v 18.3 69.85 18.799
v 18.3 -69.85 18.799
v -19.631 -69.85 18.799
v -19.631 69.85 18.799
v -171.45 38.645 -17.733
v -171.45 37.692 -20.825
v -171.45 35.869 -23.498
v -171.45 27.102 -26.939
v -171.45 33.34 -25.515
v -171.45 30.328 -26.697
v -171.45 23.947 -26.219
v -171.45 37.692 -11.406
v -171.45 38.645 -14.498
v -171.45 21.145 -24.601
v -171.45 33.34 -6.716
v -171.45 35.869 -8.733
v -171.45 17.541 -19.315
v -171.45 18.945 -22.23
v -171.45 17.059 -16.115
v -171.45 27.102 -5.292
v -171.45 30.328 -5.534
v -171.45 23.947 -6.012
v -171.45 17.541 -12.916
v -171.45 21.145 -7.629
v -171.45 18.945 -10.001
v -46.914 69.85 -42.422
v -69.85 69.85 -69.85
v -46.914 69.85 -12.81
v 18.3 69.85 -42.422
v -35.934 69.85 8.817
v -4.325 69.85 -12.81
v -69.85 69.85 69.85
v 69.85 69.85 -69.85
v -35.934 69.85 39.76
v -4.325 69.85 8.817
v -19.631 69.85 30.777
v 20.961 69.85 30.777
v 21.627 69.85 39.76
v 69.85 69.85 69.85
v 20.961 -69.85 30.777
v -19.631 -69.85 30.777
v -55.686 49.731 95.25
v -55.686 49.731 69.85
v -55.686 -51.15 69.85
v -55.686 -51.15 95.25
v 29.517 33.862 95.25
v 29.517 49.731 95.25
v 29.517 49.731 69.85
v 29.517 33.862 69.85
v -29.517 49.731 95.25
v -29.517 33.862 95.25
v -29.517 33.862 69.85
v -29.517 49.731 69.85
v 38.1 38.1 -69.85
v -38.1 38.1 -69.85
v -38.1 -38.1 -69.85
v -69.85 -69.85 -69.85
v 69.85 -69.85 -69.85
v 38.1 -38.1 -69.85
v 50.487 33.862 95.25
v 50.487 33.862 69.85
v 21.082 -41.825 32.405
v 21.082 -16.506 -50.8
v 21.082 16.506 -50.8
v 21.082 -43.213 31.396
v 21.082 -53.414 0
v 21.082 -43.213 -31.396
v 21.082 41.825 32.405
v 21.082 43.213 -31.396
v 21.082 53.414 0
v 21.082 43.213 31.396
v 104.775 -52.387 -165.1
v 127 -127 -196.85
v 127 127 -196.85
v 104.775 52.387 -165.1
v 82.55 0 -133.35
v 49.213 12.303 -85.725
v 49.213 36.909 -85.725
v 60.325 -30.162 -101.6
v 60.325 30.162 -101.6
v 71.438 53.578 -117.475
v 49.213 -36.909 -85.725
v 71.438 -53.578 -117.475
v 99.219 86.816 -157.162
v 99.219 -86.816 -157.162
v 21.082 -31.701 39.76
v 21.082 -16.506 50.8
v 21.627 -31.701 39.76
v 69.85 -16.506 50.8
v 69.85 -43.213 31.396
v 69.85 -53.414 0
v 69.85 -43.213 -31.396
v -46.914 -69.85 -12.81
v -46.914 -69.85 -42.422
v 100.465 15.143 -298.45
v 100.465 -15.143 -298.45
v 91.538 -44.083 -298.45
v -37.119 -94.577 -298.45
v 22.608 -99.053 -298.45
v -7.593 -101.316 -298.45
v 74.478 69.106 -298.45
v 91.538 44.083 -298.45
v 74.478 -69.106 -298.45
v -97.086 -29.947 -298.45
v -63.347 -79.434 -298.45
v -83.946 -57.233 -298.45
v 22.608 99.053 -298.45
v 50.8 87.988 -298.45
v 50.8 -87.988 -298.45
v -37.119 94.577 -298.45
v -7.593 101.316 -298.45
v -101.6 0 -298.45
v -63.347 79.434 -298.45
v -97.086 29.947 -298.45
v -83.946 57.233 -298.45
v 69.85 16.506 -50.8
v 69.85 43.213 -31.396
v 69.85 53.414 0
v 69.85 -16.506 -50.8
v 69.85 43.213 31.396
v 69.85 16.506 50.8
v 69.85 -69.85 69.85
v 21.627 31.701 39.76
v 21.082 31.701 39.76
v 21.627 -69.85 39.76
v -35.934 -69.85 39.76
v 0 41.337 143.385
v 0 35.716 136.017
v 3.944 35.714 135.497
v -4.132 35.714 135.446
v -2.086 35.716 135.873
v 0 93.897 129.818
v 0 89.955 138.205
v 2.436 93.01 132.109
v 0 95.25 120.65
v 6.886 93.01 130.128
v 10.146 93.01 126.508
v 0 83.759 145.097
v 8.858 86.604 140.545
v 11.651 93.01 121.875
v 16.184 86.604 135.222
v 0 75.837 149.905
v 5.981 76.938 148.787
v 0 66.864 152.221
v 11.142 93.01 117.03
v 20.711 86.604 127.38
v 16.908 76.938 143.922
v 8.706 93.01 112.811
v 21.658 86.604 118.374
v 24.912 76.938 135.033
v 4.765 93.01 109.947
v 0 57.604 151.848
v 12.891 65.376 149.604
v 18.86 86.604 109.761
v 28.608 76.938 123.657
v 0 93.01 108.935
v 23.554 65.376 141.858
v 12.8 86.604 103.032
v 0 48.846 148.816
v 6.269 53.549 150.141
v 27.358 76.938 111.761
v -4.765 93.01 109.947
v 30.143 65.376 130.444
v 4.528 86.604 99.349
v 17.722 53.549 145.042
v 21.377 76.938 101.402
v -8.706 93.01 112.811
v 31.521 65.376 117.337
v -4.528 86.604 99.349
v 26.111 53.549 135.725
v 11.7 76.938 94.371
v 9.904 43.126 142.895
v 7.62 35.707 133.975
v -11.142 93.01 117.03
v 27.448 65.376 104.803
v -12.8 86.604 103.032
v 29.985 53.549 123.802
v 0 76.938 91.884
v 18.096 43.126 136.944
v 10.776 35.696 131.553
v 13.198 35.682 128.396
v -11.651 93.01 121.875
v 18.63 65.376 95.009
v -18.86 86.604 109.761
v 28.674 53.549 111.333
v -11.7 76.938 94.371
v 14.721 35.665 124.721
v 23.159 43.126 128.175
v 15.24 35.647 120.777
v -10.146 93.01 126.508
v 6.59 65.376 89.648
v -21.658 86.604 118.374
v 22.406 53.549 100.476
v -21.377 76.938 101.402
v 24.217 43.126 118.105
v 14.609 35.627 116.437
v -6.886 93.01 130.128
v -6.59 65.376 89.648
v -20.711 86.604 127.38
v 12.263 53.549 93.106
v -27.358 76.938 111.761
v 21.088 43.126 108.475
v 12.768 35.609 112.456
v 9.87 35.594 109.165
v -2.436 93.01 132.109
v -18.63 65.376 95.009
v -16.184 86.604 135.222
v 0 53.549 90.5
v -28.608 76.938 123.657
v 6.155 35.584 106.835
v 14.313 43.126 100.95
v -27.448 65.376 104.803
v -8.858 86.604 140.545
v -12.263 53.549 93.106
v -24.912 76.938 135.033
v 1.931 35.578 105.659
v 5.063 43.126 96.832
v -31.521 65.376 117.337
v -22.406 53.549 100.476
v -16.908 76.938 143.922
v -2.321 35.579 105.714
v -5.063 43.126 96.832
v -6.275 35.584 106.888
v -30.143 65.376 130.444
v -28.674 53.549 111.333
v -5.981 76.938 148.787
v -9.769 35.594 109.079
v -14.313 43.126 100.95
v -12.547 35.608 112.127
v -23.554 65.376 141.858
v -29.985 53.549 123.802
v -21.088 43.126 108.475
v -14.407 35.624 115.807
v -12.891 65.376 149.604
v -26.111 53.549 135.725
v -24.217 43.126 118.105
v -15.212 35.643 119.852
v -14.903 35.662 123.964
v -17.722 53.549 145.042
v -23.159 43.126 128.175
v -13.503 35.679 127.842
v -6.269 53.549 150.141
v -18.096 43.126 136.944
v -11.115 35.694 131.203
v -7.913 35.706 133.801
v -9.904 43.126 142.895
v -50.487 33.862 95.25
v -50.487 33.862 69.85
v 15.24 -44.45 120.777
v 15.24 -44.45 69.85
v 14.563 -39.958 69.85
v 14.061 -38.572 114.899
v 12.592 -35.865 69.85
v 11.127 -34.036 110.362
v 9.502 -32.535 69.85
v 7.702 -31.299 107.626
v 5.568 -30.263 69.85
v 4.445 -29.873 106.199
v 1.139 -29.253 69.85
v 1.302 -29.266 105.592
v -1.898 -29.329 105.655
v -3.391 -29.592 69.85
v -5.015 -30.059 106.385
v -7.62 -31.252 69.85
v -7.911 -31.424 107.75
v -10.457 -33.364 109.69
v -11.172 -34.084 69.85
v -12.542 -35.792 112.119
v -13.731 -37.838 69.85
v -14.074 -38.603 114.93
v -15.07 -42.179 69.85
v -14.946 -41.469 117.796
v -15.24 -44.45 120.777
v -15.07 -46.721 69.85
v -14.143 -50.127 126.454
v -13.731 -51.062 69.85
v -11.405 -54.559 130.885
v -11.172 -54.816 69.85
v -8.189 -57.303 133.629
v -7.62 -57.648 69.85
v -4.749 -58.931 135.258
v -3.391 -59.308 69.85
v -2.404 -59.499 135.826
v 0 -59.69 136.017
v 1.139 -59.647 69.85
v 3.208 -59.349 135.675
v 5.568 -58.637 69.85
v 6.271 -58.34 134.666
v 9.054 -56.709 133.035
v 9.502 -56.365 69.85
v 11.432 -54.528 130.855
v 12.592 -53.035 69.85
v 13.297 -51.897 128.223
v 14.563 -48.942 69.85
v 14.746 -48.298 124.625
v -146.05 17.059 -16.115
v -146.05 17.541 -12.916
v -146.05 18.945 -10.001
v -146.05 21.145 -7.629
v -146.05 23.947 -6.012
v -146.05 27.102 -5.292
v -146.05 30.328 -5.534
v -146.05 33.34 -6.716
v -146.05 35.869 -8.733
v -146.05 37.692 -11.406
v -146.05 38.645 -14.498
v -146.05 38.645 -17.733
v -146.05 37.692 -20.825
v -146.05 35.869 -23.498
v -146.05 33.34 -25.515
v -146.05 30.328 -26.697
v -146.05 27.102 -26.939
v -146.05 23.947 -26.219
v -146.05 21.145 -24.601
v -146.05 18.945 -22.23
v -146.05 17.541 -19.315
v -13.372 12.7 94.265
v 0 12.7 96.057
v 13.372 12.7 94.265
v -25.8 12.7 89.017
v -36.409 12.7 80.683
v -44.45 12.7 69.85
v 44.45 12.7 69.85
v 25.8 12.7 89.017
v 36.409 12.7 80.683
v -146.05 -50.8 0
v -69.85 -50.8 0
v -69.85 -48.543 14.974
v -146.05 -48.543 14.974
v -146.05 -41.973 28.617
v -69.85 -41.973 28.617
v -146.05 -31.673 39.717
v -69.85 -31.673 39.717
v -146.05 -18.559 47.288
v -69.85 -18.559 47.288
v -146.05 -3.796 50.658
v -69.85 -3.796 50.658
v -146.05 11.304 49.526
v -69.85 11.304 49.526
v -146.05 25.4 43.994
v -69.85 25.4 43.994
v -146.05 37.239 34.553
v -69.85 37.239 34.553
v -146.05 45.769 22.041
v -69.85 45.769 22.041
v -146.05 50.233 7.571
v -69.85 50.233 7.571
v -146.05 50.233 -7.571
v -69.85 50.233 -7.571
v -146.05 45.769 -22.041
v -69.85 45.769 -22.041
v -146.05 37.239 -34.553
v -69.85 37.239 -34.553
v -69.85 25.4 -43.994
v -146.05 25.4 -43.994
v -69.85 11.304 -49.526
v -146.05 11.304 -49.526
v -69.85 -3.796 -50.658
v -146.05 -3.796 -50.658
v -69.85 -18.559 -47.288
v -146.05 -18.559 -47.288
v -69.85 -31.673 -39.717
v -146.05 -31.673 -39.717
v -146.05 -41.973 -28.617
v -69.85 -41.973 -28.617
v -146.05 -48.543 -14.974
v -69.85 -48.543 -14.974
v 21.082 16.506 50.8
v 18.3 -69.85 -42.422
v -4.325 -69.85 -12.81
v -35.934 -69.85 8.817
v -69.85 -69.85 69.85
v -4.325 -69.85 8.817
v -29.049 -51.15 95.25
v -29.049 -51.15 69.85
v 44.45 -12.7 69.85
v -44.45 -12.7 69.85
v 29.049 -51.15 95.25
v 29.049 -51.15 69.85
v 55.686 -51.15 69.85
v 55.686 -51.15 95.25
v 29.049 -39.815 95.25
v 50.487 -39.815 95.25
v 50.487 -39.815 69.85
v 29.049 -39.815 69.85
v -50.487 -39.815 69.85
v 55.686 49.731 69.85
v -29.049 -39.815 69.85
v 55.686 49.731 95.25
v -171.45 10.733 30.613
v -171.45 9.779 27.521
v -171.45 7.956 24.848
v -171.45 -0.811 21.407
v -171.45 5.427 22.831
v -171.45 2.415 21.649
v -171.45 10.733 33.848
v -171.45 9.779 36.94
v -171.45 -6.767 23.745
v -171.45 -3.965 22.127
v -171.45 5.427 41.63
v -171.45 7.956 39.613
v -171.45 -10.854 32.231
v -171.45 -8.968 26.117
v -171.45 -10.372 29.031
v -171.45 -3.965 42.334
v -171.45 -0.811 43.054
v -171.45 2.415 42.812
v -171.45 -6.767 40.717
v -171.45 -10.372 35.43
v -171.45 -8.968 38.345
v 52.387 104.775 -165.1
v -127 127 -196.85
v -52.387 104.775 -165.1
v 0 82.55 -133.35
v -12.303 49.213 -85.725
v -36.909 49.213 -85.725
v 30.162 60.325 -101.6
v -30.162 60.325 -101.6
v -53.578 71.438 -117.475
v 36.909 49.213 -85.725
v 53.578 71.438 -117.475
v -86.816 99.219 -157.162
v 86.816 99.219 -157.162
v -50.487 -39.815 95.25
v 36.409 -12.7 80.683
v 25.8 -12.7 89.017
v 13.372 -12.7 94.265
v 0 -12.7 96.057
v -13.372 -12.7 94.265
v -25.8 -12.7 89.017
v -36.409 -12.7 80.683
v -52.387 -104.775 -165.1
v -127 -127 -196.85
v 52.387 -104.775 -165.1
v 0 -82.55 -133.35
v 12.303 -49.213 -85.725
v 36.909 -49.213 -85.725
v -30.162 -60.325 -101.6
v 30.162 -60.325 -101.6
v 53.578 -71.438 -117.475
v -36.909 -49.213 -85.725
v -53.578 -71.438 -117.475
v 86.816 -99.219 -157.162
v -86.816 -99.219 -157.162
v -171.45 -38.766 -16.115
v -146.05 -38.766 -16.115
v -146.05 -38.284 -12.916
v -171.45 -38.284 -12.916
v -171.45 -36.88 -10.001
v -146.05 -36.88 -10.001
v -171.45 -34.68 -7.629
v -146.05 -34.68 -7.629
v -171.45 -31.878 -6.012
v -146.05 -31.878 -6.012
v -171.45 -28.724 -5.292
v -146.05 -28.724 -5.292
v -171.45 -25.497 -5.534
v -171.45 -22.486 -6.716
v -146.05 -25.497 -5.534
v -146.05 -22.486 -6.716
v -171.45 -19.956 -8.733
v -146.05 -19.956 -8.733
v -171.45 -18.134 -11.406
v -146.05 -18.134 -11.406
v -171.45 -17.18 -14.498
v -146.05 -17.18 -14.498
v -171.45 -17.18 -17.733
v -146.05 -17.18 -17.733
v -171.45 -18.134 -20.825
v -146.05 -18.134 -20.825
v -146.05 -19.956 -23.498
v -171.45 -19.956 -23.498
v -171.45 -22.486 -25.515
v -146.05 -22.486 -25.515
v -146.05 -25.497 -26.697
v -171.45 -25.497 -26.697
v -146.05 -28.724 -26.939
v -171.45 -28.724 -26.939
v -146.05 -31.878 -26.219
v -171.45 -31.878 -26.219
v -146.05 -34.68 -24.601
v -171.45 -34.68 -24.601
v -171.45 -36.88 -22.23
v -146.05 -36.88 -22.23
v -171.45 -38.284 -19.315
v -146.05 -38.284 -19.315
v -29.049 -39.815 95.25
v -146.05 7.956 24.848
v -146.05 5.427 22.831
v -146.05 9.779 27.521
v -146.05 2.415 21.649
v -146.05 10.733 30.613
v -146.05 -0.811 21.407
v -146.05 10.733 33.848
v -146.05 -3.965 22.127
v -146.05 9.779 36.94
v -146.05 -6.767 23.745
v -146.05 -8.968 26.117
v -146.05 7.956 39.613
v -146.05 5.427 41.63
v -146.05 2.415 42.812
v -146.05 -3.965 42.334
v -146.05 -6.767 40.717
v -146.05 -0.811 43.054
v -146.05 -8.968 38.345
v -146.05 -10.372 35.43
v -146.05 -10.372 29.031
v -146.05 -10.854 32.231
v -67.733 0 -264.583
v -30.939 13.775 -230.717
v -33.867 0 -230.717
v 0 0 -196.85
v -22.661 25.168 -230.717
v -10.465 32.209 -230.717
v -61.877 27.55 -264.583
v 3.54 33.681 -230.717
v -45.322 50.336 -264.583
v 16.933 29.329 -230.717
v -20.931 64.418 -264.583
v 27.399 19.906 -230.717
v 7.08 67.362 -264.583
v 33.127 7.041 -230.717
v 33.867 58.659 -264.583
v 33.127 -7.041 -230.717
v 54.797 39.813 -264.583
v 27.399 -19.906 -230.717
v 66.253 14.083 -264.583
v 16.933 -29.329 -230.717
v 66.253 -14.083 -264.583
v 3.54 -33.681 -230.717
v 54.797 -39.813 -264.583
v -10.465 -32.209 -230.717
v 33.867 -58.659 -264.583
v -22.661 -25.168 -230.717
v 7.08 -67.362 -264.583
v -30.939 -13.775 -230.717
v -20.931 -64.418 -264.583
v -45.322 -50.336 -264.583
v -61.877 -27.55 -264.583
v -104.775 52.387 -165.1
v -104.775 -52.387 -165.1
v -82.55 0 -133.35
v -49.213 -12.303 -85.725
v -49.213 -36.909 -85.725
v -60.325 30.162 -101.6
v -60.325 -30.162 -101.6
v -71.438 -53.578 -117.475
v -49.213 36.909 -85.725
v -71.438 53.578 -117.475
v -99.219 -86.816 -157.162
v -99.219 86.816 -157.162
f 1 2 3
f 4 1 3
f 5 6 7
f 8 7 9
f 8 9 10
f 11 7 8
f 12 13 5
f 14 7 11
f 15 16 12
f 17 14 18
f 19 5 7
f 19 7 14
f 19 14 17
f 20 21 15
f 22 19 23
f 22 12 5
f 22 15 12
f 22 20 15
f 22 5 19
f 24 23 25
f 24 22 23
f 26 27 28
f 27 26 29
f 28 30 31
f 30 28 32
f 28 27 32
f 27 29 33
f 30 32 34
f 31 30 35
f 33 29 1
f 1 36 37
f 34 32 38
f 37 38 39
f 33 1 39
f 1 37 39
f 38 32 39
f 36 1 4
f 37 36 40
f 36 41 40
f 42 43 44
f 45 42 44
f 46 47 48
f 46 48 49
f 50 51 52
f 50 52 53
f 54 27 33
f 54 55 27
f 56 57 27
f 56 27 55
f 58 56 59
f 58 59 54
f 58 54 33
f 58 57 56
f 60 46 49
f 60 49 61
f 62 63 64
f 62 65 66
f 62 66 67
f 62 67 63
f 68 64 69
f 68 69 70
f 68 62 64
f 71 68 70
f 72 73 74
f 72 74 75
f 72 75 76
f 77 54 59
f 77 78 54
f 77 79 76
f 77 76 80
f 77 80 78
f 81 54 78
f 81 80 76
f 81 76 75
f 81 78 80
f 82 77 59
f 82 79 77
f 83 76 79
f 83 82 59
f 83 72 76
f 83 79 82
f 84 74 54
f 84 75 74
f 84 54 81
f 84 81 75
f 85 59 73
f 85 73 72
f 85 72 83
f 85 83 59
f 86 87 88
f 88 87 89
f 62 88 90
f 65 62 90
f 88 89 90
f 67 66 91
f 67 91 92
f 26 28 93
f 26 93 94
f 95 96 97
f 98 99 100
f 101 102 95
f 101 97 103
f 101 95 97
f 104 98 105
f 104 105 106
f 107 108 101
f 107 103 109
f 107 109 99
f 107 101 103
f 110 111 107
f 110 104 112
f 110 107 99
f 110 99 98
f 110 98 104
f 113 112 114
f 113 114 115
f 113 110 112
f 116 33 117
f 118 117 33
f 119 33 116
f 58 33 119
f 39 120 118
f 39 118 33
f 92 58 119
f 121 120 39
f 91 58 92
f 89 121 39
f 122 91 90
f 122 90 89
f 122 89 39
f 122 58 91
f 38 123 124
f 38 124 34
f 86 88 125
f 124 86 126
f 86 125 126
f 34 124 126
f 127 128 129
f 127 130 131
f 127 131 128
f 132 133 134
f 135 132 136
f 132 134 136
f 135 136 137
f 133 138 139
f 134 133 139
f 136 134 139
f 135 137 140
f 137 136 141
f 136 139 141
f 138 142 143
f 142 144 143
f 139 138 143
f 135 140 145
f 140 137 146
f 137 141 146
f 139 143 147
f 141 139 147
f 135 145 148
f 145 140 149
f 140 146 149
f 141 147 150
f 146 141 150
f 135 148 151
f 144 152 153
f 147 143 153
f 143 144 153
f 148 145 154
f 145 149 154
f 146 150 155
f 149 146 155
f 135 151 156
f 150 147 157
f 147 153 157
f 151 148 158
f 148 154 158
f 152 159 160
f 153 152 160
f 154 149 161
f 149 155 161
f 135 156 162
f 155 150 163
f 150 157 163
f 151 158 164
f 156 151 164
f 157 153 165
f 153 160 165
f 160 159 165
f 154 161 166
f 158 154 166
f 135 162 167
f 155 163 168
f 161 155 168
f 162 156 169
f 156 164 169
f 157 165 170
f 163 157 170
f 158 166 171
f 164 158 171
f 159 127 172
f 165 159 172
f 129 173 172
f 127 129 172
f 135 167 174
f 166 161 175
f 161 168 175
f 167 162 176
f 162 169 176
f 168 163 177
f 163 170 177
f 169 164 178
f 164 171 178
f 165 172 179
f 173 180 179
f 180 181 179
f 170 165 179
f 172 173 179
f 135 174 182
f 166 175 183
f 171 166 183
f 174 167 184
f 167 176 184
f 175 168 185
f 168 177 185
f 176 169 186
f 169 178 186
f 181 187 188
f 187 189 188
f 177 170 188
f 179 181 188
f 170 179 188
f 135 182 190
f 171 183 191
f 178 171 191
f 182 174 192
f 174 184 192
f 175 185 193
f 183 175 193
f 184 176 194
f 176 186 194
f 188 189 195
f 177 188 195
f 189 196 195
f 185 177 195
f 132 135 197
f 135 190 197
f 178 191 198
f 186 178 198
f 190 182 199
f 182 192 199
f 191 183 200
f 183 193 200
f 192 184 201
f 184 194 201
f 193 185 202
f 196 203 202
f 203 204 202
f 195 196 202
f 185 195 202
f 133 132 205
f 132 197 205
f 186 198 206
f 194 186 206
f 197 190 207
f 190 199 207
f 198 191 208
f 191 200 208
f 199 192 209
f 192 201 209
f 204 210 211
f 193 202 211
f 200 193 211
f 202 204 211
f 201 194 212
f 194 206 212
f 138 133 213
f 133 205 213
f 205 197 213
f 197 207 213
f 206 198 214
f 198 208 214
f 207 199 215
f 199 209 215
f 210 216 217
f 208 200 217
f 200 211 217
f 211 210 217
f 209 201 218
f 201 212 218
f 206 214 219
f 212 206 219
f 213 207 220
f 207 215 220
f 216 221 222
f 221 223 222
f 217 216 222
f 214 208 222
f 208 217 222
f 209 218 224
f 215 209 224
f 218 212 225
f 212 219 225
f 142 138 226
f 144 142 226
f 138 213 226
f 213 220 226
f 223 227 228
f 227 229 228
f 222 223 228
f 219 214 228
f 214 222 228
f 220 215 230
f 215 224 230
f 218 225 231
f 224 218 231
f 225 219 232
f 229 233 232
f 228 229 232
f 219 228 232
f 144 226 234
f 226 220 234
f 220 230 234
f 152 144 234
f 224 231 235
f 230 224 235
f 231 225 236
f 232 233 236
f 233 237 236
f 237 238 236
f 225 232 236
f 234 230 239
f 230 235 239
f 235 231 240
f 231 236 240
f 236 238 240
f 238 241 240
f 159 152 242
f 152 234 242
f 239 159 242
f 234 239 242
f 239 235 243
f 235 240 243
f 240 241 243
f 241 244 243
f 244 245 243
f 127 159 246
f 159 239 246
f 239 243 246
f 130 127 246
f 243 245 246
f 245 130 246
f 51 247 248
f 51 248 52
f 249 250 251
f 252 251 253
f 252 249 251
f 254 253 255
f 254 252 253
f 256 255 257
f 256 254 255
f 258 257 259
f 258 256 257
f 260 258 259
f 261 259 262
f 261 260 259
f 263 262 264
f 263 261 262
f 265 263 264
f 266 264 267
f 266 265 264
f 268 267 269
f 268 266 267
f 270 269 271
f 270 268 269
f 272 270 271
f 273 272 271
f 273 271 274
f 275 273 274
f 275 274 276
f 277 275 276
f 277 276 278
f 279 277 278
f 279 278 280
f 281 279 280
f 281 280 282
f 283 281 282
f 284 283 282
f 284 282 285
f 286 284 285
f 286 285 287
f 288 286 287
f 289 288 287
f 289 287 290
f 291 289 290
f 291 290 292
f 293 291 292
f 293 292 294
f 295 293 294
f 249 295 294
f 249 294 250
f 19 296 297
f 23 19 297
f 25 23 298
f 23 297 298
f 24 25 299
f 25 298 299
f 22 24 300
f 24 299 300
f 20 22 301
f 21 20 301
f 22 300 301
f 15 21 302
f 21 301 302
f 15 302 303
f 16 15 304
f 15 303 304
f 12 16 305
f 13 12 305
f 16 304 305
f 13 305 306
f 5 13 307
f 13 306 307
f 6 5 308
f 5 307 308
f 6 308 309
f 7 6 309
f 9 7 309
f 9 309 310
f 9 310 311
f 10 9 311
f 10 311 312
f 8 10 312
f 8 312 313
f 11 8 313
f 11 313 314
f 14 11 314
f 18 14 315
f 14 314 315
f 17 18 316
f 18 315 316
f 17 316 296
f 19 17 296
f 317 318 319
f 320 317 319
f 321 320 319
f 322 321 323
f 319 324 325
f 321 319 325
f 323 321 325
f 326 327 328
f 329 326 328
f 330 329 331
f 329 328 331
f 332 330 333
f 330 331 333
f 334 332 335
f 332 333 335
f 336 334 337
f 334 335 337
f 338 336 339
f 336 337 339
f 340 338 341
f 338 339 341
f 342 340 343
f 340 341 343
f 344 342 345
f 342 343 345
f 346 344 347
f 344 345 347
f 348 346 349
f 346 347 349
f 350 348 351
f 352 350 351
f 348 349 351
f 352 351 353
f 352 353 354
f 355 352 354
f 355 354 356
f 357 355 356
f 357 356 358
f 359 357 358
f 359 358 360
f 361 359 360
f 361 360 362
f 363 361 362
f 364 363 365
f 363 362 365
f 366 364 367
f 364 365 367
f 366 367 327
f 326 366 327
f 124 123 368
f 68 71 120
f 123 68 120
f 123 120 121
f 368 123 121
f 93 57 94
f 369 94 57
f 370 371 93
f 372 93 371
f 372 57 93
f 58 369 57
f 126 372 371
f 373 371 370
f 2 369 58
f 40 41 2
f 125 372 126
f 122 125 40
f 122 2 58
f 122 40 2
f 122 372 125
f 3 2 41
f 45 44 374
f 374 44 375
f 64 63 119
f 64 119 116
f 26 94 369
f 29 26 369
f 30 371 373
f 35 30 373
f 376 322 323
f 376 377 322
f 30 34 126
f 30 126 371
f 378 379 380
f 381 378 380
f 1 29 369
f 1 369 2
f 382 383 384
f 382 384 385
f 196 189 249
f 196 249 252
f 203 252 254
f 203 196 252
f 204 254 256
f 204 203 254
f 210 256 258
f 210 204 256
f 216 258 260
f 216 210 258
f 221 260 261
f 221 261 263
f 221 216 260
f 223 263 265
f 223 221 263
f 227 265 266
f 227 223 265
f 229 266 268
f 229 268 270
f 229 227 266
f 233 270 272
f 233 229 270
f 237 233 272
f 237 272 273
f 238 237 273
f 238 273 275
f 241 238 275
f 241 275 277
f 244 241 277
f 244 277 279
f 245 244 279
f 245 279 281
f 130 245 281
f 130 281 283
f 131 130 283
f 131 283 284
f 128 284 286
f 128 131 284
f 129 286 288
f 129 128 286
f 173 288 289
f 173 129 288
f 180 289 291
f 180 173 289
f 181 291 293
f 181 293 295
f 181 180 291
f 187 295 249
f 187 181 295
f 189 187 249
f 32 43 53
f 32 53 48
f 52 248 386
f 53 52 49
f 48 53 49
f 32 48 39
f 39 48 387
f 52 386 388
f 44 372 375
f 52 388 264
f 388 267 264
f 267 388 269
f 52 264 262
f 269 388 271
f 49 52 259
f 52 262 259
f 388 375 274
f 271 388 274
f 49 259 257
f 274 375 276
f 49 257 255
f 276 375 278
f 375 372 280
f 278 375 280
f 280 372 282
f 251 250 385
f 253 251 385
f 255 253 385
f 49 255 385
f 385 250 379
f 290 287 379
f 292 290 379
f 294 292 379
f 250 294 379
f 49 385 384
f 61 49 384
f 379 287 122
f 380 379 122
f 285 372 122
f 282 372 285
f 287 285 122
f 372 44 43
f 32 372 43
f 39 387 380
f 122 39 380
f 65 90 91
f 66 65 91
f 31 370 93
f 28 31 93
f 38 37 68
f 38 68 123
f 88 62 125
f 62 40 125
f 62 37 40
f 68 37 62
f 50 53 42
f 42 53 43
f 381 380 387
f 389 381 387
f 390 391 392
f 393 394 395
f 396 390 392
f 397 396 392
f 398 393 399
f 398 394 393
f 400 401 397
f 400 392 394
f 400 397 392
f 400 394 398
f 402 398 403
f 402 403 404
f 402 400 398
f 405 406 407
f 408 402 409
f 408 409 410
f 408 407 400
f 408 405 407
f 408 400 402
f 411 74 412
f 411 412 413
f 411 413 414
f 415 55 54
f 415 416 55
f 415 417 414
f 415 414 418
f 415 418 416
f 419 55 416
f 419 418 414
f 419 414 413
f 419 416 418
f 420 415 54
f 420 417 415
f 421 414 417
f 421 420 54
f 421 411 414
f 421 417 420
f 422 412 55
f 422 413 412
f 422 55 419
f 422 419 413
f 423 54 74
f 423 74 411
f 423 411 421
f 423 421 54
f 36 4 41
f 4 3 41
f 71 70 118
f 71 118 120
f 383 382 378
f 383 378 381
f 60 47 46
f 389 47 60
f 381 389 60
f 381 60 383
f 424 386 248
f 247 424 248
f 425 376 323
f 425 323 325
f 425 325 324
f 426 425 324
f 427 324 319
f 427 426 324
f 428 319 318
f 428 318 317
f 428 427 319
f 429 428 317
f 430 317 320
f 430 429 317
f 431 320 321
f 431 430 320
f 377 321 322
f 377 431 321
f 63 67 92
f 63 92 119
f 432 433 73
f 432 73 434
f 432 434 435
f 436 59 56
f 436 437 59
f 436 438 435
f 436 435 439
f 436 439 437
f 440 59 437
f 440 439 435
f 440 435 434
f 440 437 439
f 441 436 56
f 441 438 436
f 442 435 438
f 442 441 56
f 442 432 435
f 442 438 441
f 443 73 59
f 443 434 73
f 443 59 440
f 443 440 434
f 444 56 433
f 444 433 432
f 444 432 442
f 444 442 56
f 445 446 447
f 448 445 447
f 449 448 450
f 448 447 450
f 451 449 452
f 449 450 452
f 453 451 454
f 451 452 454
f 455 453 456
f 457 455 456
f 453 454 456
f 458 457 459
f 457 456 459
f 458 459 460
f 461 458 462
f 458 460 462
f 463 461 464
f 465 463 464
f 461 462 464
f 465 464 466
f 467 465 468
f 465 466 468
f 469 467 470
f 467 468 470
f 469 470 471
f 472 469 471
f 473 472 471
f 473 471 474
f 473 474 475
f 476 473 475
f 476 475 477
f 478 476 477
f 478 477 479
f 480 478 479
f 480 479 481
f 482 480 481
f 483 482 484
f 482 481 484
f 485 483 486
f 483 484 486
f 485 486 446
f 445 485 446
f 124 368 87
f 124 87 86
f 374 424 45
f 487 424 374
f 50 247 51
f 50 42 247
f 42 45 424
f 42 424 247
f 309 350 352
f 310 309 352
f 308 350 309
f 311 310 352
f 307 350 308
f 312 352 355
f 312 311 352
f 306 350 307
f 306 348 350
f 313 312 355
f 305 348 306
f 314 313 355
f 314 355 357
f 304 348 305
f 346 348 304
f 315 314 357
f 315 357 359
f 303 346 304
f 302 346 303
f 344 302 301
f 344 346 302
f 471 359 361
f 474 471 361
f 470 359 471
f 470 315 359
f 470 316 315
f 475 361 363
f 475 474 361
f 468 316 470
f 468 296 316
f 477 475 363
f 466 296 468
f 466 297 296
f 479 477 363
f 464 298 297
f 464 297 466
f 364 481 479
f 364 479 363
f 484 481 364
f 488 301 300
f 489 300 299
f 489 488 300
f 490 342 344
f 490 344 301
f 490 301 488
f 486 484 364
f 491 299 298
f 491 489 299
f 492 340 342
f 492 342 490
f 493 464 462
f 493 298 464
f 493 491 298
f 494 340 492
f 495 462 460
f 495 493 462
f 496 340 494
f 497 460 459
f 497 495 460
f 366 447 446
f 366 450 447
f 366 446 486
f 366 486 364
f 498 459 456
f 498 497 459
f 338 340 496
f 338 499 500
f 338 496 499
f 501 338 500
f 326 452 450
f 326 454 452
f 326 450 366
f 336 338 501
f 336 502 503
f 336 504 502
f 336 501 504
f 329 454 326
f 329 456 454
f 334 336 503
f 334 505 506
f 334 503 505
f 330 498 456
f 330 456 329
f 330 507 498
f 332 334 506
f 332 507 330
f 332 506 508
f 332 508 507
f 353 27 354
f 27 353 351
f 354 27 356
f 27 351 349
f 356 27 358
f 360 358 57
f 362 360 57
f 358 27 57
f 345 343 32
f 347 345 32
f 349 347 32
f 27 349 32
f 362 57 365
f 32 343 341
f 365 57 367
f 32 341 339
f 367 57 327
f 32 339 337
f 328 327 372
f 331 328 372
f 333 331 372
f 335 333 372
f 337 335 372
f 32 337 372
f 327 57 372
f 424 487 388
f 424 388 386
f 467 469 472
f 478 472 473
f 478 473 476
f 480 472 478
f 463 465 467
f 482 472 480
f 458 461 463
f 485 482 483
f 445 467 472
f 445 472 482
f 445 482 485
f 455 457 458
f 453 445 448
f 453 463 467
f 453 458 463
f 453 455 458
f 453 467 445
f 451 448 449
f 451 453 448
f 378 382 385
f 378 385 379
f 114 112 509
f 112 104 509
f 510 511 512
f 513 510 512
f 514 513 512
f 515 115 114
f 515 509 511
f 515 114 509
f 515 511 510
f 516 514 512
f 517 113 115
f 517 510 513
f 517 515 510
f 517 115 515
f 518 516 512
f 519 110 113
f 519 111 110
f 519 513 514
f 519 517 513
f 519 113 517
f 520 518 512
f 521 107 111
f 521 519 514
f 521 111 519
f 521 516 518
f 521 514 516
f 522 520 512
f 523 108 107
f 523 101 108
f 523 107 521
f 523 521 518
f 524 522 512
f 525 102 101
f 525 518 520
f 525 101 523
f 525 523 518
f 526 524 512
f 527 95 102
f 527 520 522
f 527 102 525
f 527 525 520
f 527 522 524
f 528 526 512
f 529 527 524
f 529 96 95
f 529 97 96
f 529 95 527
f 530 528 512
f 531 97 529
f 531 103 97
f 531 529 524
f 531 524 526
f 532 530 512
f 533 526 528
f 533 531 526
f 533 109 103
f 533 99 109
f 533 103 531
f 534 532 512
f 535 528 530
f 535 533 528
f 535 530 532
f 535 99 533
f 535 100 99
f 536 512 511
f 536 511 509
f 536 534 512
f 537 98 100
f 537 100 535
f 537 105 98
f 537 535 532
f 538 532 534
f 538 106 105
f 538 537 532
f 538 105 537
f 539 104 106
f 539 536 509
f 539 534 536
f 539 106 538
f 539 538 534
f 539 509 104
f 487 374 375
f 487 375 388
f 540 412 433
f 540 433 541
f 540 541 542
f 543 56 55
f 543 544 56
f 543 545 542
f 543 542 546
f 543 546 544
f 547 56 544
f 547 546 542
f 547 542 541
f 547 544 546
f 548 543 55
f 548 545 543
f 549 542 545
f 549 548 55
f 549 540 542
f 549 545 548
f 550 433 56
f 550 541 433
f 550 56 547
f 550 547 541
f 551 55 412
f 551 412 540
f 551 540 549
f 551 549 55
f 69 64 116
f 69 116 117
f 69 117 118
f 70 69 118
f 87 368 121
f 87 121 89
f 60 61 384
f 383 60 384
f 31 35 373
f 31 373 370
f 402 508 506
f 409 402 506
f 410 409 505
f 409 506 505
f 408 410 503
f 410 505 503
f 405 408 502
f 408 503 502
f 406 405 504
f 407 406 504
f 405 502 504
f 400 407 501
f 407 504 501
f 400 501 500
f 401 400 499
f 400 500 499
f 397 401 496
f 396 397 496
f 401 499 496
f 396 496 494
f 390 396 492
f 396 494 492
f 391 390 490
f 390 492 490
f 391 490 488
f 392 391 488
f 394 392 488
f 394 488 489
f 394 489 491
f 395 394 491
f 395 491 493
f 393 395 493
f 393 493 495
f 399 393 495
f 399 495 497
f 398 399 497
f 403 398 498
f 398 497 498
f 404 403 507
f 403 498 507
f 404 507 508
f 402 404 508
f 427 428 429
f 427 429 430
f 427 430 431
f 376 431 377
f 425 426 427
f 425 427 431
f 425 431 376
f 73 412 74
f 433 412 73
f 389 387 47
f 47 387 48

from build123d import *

# Parameters (mm, degrees)
F0_W      = 139.7
F0_H      = 139.7
F1_DEPTH  = 69.85
F3_DEPTH  = 69.85
F5_DEPTH  = 12.7
F6_R      = 50.8
F7_DEPTH  = 76.2
F9_DEPTH  = 48.768
F10_R     = 15.24
F13_W     = 76.2
F13_H     = 76.2
F15_W     = 254
F15_H     = 254
F22_DEPTH = 25.4
F23_R     = 10.8538573116
F24_DEPTH = 25.4


with BuildPart() as f1:
    # F0 (on Front) → F1 (new body, symmetric)
    with BuildSketch(Plane.XZ):
        Rectangle(F0_W, F0_H)
    extrude(amount=F1_DEPTH, both=True)

    # F2 (on Front) → F3 (cut, symmetric)
    with BuildSketch(Plane.XZ):
        Polygon((20.9614150226, 30.7766851038), (21.6268599033, 39.7601500154), (-35.9338596463, 39.7601500154), (-35.9338596463, 8.8171046227), (-4.3253740296, 8.8171046227), (-4.3253740296, -12.8097543493), (-46.9136498868, -12.8097543493), (-46.9136498868, -42.4219146371), (18.2996485382, -42.4219146371), (18.2996485382, 18.7987312675), (-19.6305345744, 18.7987312675), (-19.6305345744, 30.7766851038), align=None)
    extrude(amount=F3_DEPTH, both=True, mode=Mode.SUBTRACT)

    # F6 (on face) → F7 (join)
    with BuildSketch(Plane(origin=(-69.85, 0, 0), x_dir=(0, -1, 0), z_dir=(-1, 0, 0))):
        Circle(F6_R)
    extrude(amount=F7_DEPTH)

    # F8 (on face) → F9 (cut)
    with BuildSketch(Plane.YZ.offset(69.85)):
        Polygon((16.5059205686, -50.8), (43.2130610643, -31.3961266285), (53.4142809913, 0), (43.2130610643, 31.3961266285), (16.5059205686, 50.8), (-16.5059205686, 50.8), (-43.2130610643, 31.3961266285), (-53.4142809913, 0), (-43.2130610643, -31.3961266285), (-16.5059205686, -50.8), align=None)
    extrude(amount=-F9_DEPTH, mode=Mode.SUBTRACT)

    # F12: sweep along a path in F11
    with BuildLine(Plane.YZ) as f12_path:
        Line((-44.45, 69.9766054749), (-44.45, 120.7766054749))
        Line((-44.45, 120.7766054749), (44.45, 120.7766054749))
    # F10 (on face) → F12 (sweep)
    with BuildSketch(Plane.XY.offset(69.85)):
        with Locations((0, -44.45)):
            Circle(F10_R)
    sweep(path=f12_path.line, transition=Transition.RIGHT)

    # F13 (on face) → F16 section 0
    with BuildSketch(Plane(origin=(0, 0, -69.85), x_dir=(1, 0, 0), z_dir=(0, 0, -1))):
        Rectangle(F13_W, F13_H)
    # F15 (on offset) → F16 section 1
    with BuildSketch(Plane(origin=(0, 0, -196.85), x_dir=(1, 0, 0), z_dir=(0, 0, -1))):
        Rectangle(F15_W, F15_H)
    loft()

    # F17 (on Right) → F18 (revolve)
    with BuildSketch(Plane.YZ):
        with BuildLine():
            ThreePointArc((95.25, 120.65), (63.5, 152.4), (31.75, 120.65))
            Line((31.75, 120.65), (95.25, 120.65))
        make_face()
    revolve(axis=Axis((0, 63.5, 120.65), (0, 1, 0)))

    # F21 (on face) → F22 (join)
    with BuildSketch(Plane.XY.offset(69.85)):
        Polygon((-29.5170042189, 49.7313141823), (-55.6858405471, 49.7313141823), (-55.6858405471, -51.1500276625), (-29.0486328304, -51.1500276625), (-29.0486328304, -39.8150421679), (-50.4867191883, -39.8150421679), (-50.4867191883, 33.8623374701), (-29.5170042189, 33.8623374701), align=None)
        Polygon((29.5170042189, 33.8623374701), (50.4867191883, 33.8623374701), (50.4867191883, -39.8150421679), (29.0486328304, -39.8150421679), (29.0486328304, -51.1500276625), (55.6858405471, -51.1500276625), (55.6858405471, 49.7313141823), (29.5170042189, 49.7313141823), align=None)
    extrude(amount=F22_DEPTH)

    # F23 (on face) → F24 (join)
    with BuildSketch(Plane(origin=(-146.05, 0, 0), x_dir=(0, -1, 0), z_dir=(-1, 0, 0))):
        with Locations((0, 32.2307120148)):
            Circle(F23_R)
        with Locations((-27.9126153868, -16.1153560074)):
            Circle(F23_R)
        with Locations((27.9126153868, -16.1153560074)):
            Circle(F23_R)
    extrude(amount=F24_DEPTH)


with BuildPart() as f5:
    # F4 (on Front) → F5 (new body, symmetric)
    with BuildSketch(Plane.XZ):
        with BuildLine():
            Line((-44.45, 69.85), (44.45, 69.85))
            ThreePointArc((44.45, 69.85), (0, 96.0565557516), (-44.45, 69.85))
        make_face()
    extrude(amount=F5_DEPTH, both=True)


with BuildPart() as f20:
    # F19 (on Front) → F20 (revolve)
    with BuildSketch(Plane.XZ):
        Polygon((0, -298.45), (0, -196.85), (-101.6, -298.45), align=None)
    revolve(axis=Axis((0, 0, -247.65), (0, 0, -1)))


solid = Compound([f1.part, f5.part, f20.part])
